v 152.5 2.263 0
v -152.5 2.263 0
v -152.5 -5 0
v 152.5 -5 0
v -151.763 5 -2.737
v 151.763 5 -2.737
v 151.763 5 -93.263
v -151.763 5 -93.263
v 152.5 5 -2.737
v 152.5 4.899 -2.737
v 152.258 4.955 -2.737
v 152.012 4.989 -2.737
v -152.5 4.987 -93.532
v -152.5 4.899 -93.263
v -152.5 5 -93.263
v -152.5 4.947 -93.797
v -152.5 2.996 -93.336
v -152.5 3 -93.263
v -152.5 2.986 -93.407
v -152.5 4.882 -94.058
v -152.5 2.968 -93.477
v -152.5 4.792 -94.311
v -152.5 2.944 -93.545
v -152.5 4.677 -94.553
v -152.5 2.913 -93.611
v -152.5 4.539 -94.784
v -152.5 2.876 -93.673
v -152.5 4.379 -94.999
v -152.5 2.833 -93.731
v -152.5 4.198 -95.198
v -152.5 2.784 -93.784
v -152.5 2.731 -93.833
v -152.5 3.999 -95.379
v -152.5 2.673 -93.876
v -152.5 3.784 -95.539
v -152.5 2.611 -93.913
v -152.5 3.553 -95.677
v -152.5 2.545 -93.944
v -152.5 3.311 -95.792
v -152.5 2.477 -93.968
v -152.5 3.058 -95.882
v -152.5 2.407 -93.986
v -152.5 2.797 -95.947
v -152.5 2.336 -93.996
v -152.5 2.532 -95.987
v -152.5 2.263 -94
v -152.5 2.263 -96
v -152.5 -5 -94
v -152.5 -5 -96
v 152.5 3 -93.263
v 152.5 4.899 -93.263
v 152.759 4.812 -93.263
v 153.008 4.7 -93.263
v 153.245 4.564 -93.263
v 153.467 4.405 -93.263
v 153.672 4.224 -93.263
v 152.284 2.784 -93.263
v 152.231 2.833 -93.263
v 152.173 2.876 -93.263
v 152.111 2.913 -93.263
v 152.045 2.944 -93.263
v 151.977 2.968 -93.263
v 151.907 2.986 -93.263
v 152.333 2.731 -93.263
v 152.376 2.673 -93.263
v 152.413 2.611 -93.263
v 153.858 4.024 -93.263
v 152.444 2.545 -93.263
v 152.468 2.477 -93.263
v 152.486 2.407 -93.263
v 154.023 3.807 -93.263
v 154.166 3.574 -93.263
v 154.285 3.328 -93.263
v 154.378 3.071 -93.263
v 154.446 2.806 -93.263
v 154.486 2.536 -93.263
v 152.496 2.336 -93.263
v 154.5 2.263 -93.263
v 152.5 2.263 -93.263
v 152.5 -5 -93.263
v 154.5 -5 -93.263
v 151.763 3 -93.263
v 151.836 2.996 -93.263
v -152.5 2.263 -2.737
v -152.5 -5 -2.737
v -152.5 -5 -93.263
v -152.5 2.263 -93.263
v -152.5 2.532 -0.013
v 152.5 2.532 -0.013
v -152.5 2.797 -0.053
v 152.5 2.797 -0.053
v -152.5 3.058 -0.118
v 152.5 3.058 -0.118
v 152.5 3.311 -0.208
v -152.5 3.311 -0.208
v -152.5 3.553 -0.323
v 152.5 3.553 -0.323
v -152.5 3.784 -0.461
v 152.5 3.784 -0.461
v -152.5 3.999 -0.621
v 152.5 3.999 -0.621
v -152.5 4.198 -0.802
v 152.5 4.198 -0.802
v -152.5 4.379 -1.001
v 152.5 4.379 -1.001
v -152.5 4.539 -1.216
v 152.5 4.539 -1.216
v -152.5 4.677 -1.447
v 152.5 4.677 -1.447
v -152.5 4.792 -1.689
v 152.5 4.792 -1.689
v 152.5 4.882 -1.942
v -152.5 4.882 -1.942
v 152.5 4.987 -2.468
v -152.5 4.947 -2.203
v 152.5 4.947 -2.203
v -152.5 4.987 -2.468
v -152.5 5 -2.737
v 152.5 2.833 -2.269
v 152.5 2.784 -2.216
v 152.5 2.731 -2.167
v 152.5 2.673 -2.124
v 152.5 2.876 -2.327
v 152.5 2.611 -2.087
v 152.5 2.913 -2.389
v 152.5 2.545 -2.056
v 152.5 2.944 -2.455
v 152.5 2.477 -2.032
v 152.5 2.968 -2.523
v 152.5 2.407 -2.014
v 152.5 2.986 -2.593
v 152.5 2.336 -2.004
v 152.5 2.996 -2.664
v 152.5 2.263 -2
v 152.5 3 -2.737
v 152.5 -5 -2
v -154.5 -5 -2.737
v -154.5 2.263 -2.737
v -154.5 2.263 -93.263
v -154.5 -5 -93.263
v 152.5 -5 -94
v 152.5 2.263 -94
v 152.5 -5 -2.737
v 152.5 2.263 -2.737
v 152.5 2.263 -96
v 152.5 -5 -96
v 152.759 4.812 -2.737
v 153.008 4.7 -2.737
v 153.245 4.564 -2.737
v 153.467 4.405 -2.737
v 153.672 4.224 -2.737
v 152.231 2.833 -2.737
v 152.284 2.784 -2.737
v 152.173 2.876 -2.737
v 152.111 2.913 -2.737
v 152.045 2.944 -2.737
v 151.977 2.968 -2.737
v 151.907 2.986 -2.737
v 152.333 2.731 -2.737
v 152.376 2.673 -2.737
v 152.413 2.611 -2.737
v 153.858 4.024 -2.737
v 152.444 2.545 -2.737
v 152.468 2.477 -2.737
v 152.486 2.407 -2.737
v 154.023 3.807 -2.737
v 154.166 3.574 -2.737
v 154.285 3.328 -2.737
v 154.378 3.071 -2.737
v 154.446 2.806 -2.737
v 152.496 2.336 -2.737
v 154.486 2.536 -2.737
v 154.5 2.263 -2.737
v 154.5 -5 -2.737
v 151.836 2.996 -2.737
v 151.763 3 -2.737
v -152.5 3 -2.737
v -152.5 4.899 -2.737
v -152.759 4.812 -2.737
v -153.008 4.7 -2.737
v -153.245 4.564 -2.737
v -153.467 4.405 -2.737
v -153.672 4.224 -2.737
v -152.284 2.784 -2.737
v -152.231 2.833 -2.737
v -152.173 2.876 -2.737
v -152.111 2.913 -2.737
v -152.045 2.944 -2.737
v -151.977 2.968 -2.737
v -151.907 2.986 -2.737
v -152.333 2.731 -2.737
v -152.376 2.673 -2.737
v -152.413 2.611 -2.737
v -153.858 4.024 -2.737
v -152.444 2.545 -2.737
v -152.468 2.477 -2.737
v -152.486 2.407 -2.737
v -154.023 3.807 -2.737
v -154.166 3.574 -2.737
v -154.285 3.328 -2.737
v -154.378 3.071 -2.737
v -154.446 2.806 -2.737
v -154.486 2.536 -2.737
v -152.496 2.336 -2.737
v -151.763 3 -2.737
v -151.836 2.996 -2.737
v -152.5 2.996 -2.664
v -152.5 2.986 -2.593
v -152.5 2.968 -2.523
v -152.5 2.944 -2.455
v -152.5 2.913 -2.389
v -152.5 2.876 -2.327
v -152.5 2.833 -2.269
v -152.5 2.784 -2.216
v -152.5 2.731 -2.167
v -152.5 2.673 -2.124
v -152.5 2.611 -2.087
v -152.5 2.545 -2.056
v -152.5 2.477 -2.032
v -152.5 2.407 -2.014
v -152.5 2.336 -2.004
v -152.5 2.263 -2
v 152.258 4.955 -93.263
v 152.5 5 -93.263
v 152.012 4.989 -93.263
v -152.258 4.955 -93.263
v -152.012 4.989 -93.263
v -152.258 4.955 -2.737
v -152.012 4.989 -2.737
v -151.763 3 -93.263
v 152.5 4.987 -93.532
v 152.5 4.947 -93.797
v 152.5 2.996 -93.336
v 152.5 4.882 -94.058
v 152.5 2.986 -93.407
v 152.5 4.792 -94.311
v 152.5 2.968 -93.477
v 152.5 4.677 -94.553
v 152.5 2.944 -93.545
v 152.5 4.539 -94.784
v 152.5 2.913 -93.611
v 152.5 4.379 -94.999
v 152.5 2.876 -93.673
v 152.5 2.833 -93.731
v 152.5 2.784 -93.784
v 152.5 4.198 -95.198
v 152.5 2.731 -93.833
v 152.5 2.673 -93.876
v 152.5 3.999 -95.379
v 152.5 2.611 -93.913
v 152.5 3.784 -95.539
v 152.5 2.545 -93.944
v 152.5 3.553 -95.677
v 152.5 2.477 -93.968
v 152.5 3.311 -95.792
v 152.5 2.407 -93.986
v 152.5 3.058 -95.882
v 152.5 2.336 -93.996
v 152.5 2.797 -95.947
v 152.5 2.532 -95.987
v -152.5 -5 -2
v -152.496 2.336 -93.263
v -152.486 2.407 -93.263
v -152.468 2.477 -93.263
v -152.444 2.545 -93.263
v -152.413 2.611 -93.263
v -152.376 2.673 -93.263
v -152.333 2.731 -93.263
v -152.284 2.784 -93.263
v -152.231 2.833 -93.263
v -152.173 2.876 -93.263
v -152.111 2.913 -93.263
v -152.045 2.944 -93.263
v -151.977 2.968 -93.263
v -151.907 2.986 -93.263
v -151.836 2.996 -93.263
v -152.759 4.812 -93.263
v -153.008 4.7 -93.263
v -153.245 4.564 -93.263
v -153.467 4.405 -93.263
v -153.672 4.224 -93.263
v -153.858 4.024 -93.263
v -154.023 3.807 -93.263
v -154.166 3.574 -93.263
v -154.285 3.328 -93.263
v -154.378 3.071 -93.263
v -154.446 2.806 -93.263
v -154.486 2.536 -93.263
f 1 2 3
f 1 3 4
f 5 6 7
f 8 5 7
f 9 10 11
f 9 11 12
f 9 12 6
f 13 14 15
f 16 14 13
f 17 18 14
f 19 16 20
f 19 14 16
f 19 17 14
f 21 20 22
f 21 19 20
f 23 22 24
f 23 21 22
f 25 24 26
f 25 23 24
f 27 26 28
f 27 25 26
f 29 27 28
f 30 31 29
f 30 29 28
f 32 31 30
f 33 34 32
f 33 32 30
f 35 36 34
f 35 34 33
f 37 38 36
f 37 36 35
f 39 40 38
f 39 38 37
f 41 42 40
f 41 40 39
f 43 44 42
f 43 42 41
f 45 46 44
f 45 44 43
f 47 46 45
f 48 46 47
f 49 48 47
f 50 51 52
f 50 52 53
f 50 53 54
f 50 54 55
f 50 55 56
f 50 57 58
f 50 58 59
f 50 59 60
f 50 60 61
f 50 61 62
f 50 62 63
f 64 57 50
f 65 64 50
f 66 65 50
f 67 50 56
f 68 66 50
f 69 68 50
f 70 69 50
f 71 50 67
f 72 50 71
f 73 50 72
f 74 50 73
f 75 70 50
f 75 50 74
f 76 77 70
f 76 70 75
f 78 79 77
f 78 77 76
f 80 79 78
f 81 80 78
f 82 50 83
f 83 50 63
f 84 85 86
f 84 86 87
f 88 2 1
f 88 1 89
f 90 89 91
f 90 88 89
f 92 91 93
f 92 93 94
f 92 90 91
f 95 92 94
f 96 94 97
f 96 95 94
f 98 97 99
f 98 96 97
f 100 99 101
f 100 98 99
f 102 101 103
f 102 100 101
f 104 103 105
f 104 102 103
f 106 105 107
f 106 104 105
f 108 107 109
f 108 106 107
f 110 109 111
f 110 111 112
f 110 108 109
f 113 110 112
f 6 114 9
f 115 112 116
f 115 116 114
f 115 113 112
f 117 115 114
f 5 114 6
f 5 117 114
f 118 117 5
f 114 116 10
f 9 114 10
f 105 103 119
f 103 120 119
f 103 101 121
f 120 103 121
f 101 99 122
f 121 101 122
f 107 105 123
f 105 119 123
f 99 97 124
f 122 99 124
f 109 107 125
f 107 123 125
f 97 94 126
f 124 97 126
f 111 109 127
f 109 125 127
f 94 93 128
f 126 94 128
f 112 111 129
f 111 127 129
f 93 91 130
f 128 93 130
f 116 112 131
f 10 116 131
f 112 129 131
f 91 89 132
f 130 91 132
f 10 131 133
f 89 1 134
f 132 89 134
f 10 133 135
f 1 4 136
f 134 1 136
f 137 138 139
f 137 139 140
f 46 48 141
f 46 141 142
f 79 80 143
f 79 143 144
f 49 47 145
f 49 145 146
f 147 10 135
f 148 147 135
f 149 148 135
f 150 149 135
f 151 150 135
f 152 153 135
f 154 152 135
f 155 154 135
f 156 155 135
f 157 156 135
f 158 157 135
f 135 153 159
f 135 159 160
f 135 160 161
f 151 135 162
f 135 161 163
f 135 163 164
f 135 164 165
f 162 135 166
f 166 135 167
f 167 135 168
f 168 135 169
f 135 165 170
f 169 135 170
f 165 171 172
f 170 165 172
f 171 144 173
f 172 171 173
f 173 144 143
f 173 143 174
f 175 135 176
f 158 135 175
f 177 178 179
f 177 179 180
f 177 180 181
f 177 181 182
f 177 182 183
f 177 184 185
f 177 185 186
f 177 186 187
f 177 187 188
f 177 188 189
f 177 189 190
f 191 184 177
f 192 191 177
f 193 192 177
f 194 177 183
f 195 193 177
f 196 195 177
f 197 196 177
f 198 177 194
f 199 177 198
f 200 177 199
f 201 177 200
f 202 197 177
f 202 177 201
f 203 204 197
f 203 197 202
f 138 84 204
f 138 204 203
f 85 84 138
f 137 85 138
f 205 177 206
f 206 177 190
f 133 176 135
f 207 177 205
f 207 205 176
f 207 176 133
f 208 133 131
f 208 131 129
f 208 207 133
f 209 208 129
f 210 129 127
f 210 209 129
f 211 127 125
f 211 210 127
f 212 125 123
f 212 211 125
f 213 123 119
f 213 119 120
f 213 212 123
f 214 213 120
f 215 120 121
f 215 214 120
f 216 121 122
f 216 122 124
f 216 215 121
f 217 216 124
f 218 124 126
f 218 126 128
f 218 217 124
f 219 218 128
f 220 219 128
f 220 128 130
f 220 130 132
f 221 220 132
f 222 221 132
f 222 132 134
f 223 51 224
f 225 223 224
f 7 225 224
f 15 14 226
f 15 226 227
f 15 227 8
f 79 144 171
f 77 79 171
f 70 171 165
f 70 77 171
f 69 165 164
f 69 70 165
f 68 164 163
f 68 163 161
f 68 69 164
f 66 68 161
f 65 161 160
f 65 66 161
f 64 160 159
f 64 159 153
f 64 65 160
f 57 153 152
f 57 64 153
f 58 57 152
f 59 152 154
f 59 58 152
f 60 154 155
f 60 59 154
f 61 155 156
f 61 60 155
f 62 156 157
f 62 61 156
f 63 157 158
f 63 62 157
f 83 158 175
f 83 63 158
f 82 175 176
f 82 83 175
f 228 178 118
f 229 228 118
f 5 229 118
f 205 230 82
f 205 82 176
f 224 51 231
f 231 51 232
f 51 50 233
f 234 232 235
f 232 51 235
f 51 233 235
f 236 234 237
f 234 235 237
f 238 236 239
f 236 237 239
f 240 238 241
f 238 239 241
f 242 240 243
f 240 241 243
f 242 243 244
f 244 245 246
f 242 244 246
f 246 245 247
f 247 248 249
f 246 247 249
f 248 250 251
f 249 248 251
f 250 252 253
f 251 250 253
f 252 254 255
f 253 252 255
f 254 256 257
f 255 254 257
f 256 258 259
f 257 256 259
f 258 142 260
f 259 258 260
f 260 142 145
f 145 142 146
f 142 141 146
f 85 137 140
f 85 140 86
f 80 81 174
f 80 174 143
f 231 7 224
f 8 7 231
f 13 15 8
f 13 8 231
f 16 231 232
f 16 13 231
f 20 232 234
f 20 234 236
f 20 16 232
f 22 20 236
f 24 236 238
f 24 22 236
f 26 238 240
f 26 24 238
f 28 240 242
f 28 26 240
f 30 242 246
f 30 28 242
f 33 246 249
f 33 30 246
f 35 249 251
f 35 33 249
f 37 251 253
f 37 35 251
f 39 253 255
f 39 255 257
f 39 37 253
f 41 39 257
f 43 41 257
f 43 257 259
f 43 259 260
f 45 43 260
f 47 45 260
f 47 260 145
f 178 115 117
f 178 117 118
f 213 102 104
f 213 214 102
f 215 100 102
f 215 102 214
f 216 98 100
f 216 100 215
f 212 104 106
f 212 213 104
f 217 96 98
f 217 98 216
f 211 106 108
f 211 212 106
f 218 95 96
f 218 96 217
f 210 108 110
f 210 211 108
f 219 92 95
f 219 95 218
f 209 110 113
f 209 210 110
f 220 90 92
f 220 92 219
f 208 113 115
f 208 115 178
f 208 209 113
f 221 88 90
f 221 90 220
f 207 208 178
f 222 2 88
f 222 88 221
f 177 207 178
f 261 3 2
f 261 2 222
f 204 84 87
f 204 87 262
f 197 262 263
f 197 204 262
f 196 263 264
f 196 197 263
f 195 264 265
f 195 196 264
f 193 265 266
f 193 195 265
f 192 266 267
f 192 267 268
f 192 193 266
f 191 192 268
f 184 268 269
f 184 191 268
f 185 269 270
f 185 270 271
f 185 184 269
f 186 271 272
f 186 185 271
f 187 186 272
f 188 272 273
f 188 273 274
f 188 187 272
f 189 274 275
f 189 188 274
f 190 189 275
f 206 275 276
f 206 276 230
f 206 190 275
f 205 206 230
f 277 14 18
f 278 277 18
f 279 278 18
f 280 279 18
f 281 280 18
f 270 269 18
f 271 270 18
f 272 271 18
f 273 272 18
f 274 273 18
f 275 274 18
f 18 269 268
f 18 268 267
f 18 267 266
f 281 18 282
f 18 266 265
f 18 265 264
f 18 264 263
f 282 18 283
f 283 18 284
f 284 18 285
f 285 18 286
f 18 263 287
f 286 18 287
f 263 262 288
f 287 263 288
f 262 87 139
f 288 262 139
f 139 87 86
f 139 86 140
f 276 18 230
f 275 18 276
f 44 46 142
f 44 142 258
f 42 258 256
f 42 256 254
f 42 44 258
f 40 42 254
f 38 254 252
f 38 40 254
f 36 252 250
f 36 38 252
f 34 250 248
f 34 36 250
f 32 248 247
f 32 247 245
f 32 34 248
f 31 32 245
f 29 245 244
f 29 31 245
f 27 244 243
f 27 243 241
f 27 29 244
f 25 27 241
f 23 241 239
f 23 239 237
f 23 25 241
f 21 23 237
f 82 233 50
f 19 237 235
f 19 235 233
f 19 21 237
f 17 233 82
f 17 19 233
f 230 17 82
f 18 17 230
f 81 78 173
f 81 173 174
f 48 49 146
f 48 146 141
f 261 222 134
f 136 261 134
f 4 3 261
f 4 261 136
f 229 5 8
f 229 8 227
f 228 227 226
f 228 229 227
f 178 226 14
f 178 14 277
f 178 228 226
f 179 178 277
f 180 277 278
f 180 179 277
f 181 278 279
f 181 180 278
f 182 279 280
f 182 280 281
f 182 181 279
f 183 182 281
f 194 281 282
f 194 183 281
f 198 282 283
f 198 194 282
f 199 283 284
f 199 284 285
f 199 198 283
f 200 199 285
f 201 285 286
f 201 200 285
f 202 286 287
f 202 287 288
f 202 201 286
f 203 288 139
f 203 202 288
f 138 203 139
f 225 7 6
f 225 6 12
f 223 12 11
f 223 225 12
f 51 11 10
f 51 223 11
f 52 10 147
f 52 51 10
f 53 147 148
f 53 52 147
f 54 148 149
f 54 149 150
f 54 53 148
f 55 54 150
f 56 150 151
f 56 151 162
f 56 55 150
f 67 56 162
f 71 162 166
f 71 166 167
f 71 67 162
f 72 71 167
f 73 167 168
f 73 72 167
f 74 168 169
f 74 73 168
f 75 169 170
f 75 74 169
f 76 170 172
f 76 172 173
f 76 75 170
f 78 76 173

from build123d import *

# Parameters (mm, degrees)
SKETCH1_W                    = 305
SKETCH1_H                    = 10
BASE_FLANGE3_DEPTH           = 2
EDGE_FLANGE1_STRIP_W         = 9.4732
EDGE_FLANGE1_STRIP_H         = 2
EDGE_FLANGE1_STRIP_CUT_DEPTH = 305
EDGE_FLANGE1_DEPTH           = 305
EDGE_FLANGE2_STRIP_W         = 9.4732
EDGE_FLANGE2_STRIP_H         = 2
EDGE_FLANGE2_STRIP_CUT_DEPTH = 305
EDGE_FLANGE2_DEPTH           = 305
EDGE_FLANGE3_STRIP_W         = 9.4732
EDGE_FLANGE3_STRIP_H         = 2
EDGE_FLANGE3_STRIP_CUT_DEPTH = 90.5268
EDGE_FLANGE3_DEPTH           = 90.5268
EDGE_FLANGE4_STRIP_W         = 9.4732
EDGE_FLANGE4_STRIP_H         = 2
EDGE_FLANGE4_STRIP_CUT_DEPTH = 90.5268
EDGE_FLANGE4_DEPTH           = 90.5268


# Sheet-metal steps are written as plain solids
with BuildPart() as part:
    # Sketch1 → Base-Flange3 (new body)
    with BuildSketch(Plane.XY):
        Rectangle(SKETCH1_W, SKETCH1_H)
    extrude(amount=-BASE_FLANGE3_DEPTH)

    # Edge-Flange1 strip (across the edge) → Edge-Flange1 strip cut (cut)
    with BuildSketch(Plane(origin=(-152.5, 5, -2), x_dir=(0, -1, 0), z_dir=(1, 0, 0))):
        with Locations((-2, -1)):
            Rectangle(EDGE_FLANGE1_STRIP_W, EDGE_FLANGE1_STRIP_H)
    extrude(amount=EDGE_FLANGE1_STRIP_CUT_DEPTH, mode=Mode.SUBTRACT)

    # Edge-Flange1 section (across the edge) → Edge-Flange1 (add)
    with BuildSketch(Plane(origin=(-152.5, 5, -2), x_dir=(0, -1, 0), z_dir=(1, 0, 0))):
        with BuildLine():
            Line((0, 0.7366), (0, 94))
            Line((0, 94), (2, 94))
            Line((2, 94), (2, 0.7366))
            ThreePointArc((2, 0.7366), (2.215745145, 0.215745145), (2.7366, 0))
            Line((2.7366, 0), (2.7366, -2))
            ThreePointArc((2.7366, -2), (0.801531583, -1.198468417), (0, 0.7366))
        make_face()
    extrude(amount=EDGE_FLANGE1_DEPTH)

    # Edge-Flange2 strip (across the edge) → Edge-Flange2 strip cut (cut)
    with BuildSketch(Plane(origin=(-152.5, 3, -96), x_dir=(0, 0, 1), z_dir=(1, 0, 0))):
        with Locations((-2, -1)):
            Rectangle(EDGE_FLANGE2_STRIP_W, EDGE_FLANGE2_STRIP_H)
    extrude(amount=EDGE_FLANGE2_STRIP_CUT_DEPTH, mode=Mode.SUBTRACT)

    # Edge-Flange2 section (across the edge) → Edge-Flange2 (add)
    with BuildSketch(Plane(origin=(-152.5, 3, -96), x_dir=(0, 0, 1), z_dir=(1, 0, 0))):
        with BuildLine():
            Line((0, 0.7366), (0, 8))
            Line((0, 8), (2, 8))
            Line((2, 8), (2, 0.7366))
            ThreePointArc((2, 0.7366), (2.215745145, 0.215745145), (2.7366, 0))
            Line((2.7366, 0), (2.7366, -2))
            ThreePointArc((2.7366, -2), (0.801531583, -1.198468417), (0, 0.7366))
        make_face()
    extrude(amount=EDGE_FLANGE2_DEPTH)

    # Edge-Flange3 strip (across the edge) → Edge-Flange3 strip cut (cut)
    with BuildSketch(Plane(origin=(-152.5, 3, -2.7366), x_dir=(1, 0, 0), z_dir=(0, 0, -1))):
        with Locations((-4, -1)):
            Rectangle(EDGE_FLANGE3_STRIP_W, EDGE_FLANGE3_STRIP_H)
    extrude(amount=EDGE_FLANGE3_STRIP_CUT_DEPTH, mode=Mode.SUBTRACT)

    # Edge-Flange3 section (across the edge) → Edge-Flange3 (add)
    with BuildSketch(Plane(origin=(-152.5, 3, -2.7366), x_dir=(1, 0, 0), z_dir=(0, 0, -1))):
        with BuildLine():
            Line((-2, 0.7366), (-2, 8))
            Line((-2, 8), (0, 8))
            Line((0, 8), (0, 0.7366))
            ThreePointArc((0, 0.7366), (0.215745145, 0.215745145), (0.7366, 0))
            Line((0.7366, 0), (0.7366, -2))
            ThreePointArc((0.7366, -2), (-1.198468417, -1.198468417), (-2, 0.7366))
        make_face()
    extrude(amount=EDGE_FLANGE3_DEPTH)

    # Edge-Flange4 strip (across the edge) → Edge-Flange4 strip cut (cut)
    with BuildSketch(Plane(origin=(152.5, 3, -93.2634), x_dir=(-1, 0, 0), z_dir=(0, 0, 1))):
        with Locations((-4, -1)):
            Rectangle(EDGE_FLANGE4_STRIP_W, EDGE_FLANGE4_STRIP_H)
    extrude(amount=EDGE_FLANGE4_STRIP_CUT_DEPTH, mode=Mode.SUBTRACT)

    # Edge-Flange4 section (across the edge) → Edge-Flange4 (add)
    with BuildSketch(Plane(origin=(152.5, 3, -93.2634), x_dir=(-1, 0, 0), z_dir=(0, 0, 1))):
        with BuildLine():
            Line((-2, 0.7366), (-2, 8))
            Line((-2, 8), (0, 8))
            Line((0, 8), (0, 0.7366))
            ThreePointArc((0, 0.7366), (0.215745145, 0.215745145), (0.7366, 0))
            Line((0.7366, 0), (0.7366, -2))
            ThreePointArc((0.7366, -2), (-1.198468417, -1.198468417), (-2, 0.7366))
        make_face()
    extrude(amount=EDGE_FLANGE4_DEPTH)


solid = part.part
